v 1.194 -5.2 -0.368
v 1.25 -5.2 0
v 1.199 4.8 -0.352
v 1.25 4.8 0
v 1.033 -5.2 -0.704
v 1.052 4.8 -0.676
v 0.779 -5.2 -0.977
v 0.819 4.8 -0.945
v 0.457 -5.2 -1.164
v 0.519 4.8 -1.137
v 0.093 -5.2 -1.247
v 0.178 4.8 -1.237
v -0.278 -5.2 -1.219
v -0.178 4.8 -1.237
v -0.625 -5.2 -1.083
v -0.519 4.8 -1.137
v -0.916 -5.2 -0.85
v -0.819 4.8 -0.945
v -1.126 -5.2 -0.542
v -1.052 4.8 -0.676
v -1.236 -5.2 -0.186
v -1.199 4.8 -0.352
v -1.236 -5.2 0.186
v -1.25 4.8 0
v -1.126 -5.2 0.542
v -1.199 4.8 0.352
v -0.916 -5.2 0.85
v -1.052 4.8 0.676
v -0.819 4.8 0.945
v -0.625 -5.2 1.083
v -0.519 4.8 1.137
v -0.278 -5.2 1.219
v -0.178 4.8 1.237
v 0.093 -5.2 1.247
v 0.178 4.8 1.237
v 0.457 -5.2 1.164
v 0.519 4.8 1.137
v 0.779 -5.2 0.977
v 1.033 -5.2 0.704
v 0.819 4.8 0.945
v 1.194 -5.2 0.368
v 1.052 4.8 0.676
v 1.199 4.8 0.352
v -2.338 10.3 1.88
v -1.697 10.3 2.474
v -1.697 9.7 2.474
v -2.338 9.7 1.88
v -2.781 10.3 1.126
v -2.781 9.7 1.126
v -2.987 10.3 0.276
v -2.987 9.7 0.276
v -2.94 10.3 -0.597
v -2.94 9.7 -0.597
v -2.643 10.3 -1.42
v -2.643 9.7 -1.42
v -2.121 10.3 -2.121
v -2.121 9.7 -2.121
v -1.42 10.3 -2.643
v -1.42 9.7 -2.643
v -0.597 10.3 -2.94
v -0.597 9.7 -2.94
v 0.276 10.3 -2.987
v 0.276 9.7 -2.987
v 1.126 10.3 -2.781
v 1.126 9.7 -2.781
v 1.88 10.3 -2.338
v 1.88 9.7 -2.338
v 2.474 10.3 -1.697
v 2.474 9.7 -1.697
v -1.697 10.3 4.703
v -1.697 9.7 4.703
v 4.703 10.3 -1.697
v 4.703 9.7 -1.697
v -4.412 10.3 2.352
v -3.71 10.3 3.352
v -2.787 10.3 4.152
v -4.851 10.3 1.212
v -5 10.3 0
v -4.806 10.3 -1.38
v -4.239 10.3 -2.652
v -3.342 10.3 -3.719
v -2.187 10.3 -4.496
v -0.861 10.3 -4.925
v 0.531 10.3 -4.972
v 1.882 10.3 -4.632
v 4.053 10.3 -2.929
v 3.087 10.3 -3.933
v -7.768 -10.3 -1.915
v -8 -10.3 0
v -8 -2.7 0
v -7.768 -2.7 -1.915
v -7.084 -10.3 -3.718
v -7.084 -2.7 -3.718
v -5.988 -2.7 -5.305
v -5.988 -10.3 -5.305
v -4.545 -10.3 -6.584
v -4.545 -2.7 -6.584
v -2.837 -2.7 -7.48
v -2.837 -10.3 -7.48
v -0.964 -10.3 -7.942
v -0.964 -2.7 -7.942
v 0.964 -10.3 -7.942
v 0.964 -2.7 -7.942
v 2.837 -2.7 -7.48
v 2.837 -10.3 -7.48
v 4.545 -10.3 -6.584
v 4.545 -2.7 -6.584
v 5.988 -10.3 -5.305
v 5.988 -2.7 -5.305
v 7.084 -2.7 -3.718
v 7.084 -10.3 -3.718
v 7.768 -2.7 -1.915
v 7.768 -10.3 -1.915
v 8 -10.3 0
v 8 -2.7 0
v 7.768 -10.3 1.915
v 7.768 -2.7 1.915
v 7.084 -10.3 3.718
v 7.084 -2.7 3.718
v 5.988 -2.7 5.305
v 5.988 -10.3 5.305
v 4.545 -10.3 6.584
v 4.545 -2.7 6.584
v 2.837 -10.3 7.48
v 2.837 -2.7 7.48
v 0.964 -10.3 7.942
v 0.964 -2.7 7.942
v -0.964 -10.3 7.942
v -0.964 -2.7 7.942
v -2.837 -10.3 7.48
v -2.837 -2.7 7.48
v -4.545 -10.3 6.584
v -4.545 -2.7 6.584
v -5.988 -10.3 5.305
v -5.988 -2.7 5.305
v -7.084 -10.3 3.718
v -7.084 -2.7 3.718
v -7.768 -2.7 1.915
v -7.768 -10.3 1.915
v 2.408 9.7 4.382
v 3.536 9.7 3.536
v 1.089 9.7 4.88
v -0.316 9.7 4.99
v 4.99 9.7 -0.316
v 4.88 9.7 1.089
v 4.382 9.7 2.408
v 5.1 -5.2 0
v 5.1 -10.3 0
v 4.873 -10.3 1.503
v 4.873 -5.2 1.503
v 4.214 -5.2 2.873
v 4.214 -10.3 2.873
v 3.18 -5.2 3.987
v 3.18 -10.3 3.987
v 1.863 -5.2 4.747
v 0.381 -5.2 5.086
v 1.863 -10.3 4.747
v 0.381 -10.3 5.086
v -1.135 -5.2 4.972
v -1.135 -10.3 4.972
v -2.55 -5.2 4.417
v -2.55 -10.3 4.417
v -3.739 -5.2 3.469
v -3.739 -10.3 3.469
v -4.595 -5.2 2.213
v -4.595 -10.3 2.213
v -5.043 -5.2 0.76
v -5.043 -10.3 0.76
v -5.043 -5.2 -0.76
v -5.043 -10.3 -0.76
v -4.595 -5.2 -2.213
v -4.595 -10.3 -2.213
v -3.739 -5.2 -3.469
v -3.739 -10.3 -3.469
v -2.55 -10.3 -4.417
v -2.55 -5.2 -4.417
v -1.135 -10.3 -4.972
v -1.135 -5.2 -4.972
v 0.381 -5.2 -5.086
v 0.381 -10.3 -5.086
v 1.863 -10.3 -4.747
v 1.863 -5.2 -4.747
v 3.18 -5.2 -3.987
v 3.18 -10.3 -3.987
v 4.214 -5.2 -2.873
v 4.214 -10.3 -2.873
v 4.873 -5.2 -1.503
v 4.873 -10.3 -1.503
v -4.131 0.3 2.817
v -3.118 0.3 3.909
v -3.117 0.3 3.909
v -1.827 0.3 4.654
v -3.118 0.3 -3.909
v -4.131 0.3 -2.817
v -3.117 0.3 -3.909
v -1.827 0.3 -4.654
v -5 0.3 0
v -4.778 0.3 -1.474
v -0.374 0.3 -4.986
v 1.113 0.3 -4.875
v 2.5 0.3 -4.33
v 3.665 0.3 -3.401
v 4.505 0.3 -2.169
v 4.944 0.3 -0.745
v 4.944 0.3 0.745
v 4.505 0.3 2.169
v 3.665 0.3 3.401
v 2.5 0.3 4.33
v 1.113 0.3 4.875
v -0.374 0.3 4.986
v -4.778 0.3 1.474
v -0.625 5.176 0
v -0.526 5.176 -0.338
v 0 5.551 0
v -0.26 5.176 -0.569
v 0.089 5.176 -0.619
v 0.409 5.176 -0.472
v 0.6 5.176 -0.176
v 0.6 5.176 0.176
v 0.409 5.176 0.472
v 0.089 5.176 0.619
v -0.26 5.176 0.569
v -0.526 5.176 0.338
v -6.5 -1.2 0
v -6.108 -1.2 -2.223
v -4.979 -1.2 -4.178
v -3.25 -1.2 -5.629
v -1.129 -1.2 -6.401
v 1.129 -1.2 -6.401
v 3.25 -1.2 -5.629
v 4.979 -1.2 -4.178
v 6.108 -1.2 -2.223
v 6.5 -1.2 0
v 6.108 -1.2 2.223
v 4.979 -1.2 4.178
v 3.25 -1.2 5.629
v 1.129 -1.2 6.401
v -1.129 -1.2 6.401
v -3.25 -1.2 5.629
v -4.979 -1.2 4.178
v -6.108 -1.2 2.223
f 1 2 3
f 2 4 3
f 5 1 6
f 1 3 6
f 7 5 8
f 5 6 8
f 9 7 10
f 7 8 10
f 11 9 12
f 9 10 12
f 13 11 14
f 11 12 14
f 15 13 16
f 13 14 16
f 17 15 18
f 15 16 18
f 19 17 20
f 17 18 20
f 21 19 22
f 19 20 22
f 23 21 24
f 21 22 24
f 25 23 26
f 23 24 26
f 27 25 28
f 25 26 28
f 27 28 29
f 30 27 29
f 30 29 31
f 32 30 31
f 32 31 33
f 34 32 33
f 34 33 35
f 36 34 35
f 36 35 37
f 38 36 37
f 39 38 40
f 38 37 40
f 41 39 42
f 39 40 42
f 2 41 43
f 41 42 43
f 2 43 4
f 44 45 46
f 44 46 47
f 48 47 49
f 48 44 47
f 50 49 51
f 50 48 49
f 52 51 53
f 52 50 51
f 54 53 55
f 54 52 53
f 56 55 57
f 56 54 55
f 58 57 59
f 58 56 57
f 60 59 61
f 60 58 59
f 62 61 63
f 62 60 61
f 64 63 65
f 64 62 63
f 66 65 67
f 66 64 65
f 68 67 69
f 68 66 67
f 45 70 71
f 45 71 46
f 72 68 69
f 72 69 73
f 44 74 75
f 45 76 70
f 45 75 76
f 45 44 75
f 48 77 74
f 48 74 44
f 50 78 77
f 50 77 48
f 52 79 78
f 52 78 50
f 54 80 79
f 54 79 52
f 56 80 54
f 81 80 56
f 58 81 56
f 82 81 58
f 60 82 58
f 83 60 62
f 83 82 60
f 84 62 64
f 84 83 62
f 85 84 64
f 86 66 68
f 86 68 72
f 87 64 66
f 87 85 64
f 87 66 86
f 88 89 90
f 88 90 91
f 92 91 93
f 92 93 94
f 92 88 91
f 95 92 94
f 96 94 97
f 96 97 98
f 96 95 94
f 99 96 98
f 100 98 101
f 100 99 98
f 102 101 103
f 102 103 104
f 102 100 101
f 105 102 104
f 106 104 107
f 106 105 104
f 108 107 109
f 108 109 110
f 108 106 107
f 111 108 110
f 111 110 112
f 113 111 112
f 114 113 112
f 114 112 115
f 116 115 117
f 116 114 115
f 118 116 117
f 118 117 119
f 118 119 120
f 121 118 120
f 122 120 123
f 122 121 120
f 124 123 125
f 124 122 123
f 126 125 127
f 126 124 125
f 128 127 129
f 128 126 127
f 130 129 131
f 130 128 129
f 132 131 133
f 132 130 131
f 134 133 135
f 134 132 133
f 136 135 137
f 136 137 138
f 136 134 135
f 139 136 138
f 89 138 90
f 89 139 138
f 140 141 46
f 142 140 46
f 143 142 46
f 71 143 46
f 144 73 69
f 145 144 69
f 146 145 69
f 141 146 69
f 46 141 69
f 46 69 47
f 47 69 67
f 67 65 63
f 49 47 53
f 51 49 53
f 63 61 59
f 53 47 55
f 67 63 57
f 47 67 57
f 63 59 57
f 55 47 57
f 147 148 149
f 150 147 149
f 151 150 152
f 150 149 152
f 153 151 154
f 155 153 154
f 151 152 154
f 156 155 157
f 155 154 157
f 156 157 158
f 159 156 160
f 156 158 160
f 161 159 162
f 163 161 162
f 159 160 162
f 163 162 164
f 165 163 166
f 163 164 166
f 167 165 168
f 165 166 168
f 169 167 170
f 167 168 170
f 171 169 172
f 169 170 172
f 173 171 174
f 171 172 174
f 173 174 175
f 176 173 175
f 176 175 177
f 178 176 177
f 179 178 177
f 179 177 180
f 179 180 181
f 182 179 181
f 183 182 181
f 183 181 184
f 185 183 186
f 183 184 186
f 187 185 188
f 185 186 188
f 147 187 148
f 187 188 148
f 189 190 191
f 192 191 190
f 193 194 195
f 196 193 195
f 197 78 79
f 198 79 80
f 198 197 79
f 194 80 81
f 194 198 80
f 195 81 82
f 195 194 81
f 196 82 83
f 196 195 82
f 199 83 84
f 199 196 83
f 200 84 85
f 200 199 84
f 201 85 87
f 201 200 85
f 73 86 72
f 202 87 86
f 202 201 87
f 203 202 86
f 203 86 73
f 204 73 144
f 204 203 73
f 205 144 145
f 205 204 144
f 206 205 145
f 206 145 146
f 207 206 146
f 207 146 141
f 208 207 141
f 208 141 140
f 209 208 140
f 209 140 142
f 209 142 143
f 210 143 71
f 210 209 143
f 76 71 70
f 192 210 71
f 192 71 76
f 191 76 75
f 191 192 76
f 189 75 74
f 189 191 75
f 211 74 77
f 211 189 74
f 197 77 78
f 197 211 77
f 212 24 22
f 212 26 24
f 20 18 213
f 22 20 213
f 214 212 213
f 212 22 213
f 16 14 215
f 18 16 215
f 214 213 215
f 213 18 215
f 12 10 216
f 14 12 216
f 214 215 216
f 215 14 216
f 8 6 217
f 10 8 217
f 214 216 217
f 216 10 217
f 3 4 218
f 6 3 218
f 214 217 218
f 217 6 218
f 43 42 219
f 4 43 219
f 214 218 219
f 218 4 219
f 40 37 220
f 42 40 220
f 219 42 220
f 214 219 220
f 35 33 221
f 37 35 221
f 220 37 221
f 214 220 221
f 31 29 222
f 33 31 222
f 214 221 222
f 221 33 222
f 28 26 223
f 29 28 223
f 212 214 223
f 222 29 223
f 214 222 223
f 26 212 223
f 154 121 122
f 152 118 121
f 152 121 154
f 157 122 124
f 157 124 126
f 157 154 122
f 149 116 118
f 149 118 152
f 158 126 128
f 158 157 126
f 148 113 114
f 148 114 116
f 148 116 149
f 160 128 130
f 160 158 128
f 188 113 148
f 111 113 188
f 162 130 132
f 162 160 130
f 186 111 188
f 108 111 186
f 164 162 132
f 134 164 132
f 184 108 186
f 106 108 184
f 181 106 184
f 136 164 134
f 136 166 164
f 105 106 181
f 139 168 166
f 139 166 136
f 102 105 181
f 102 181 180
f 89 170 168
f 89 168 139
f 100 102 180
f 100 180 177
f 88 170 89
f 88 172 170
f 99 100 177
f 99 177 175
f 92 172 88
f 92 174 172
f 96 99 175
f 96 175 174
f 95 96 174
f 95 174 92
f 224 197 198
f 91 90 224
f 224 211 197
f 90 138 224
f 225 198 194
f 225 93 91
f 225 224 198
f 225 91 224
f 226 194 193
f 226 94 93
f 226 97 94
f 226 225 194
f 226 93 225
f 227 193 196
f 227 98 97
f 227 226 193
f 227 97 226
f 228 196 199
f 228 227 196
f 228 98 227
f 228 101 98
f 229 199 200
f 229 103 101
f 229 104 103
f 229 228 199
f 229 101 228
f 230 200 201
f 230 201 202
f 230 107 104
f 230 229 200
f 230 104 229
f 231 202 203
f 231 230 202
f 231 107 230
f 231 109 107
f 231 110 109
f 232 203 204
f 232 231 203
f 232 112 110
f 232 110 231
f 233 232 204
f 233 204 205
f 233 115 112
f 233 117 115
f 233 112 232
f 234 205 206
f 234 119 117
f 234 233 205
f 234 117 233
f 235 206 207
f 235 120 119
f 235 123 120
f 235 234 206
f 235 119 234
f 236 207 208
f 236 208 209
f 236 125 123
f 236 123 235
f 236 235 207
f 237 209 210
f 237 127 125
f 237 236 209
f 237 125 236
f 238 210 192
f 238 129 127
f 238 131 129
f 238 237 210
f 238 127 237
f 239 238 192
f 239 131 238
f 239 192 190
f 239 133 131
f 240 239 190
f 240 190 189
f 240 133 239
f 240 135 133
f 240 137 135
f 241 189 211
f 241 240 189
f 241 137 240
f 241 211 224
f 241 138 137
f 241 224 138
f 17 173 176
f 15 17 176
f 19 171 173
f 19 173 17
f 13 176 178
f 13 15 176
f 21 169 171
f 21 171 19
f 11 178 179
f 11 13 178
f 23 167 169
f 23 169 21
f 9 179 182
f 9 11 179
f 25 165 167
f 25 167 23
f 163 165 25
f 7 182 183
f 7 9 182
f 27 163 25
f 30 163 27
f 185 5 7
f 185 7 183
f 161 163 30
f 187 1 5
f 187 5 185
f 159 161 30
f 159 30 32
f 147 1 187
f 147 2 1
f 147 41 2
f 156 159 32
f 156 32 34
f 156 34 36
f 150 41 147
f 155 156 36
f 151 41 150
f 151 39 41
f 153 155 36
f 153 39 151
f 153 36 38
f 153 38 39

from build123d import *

# Parameters (mm, degrees)
CUT_EXTRUDE_871_DEPTH  = 0.6
CHAMFER_1_SIZE         = 3
SKETCH_5_R             = 5.1
CUT_EXTRUDE_1040_DEPTH = 5.1
HOLE_WIZARD_M3_D       = 2.5
HOLE_WIZARD_M3_DEPTH   = 10
HOLE_WIZARD_M3_TIP     = 0.751075774


with BuildPart() as part:
    # Эскиз1 → Revolve 522 (revolve)
    with BuildSketch(Plane.XY):
        Polygon((0, 10.3), (-5, 10.3), (-5, 0.3), (-8, 0.3), (-8, -10.3), (0, -10.3), align=None)
    revolve(axis=Axis((0, 10.3, 0), (0, -1, 0)))

    # Эскиз4 → Cut-Extrude 871 (cut)
    with BuildSketch(Plane(origin=(0, 10.3, 0), x_dir=(1, 0, 0), z_dir=(0, 1, 0))):
        with BuildLine():
            Line((2.474108329, 1.696699141), (5.303300859, 1.696699141))
            Line((5.303300859, 1.696699141), (5.303300859, -5.303300859))
            Line((5.303300859, -5.303300859), (-1.696699141, -5.303300859))
            Line((-1.696699141, -5.303300859), (-1.696699141, -2.474108329))
            ThreePointArc((-1.696699141, -2.474108329), (-2.121320344, 2.121320344), (2.474108329, 1.696699141))
        make_face()
    extrude(amount=-CUT_EXTRUDE_871_DEPTH, mode=Mode.SUBTRACT)

    # Фаска1
    chamfer_1_edges = [part.edges().sort_by_distance(p)[0] for p in [
        (8, 0.3, 0),
    ]]
    chamfer(chamfer_1_edges, length=CHAMFER_1_SIZE - 0.0001)  # a hair under: the kernel refuses the full size

    # Эскиз5 → Cut-Extrude 1040 (cut)
    with BuildSketch(Plane.XZ.offset(10.3)):
        Circle(SKETCH_5_R)
    extrude(amount=-CUT_EXTRUDE_1040_DEPTH, mode=Mode.SUBTRACT)

    # Крепление магнита M3
    with Locations(Plane(origin=(0, -5.2, 0), x_dir=(-1, 0, 0), z_dir=(0, -1, 0))):
        with Locations((0, 0)):
            Hole(HOLE_WIZARD_M3_D / 2, depth=HOLE_WIZARD_M3_DEPTH)
            with Locations((0, 0, -(HOLE_WIZARD_M3_DEPTH + HOLE_WIZARD_M3_TIP / 2))):  # 118° drill point
                Cone(0, HOLE_WIZARD_M3_D / 2, HOLE_WIZARD_M3_TIP, mode=Mode.SUBTRACT)


solid = part.part
